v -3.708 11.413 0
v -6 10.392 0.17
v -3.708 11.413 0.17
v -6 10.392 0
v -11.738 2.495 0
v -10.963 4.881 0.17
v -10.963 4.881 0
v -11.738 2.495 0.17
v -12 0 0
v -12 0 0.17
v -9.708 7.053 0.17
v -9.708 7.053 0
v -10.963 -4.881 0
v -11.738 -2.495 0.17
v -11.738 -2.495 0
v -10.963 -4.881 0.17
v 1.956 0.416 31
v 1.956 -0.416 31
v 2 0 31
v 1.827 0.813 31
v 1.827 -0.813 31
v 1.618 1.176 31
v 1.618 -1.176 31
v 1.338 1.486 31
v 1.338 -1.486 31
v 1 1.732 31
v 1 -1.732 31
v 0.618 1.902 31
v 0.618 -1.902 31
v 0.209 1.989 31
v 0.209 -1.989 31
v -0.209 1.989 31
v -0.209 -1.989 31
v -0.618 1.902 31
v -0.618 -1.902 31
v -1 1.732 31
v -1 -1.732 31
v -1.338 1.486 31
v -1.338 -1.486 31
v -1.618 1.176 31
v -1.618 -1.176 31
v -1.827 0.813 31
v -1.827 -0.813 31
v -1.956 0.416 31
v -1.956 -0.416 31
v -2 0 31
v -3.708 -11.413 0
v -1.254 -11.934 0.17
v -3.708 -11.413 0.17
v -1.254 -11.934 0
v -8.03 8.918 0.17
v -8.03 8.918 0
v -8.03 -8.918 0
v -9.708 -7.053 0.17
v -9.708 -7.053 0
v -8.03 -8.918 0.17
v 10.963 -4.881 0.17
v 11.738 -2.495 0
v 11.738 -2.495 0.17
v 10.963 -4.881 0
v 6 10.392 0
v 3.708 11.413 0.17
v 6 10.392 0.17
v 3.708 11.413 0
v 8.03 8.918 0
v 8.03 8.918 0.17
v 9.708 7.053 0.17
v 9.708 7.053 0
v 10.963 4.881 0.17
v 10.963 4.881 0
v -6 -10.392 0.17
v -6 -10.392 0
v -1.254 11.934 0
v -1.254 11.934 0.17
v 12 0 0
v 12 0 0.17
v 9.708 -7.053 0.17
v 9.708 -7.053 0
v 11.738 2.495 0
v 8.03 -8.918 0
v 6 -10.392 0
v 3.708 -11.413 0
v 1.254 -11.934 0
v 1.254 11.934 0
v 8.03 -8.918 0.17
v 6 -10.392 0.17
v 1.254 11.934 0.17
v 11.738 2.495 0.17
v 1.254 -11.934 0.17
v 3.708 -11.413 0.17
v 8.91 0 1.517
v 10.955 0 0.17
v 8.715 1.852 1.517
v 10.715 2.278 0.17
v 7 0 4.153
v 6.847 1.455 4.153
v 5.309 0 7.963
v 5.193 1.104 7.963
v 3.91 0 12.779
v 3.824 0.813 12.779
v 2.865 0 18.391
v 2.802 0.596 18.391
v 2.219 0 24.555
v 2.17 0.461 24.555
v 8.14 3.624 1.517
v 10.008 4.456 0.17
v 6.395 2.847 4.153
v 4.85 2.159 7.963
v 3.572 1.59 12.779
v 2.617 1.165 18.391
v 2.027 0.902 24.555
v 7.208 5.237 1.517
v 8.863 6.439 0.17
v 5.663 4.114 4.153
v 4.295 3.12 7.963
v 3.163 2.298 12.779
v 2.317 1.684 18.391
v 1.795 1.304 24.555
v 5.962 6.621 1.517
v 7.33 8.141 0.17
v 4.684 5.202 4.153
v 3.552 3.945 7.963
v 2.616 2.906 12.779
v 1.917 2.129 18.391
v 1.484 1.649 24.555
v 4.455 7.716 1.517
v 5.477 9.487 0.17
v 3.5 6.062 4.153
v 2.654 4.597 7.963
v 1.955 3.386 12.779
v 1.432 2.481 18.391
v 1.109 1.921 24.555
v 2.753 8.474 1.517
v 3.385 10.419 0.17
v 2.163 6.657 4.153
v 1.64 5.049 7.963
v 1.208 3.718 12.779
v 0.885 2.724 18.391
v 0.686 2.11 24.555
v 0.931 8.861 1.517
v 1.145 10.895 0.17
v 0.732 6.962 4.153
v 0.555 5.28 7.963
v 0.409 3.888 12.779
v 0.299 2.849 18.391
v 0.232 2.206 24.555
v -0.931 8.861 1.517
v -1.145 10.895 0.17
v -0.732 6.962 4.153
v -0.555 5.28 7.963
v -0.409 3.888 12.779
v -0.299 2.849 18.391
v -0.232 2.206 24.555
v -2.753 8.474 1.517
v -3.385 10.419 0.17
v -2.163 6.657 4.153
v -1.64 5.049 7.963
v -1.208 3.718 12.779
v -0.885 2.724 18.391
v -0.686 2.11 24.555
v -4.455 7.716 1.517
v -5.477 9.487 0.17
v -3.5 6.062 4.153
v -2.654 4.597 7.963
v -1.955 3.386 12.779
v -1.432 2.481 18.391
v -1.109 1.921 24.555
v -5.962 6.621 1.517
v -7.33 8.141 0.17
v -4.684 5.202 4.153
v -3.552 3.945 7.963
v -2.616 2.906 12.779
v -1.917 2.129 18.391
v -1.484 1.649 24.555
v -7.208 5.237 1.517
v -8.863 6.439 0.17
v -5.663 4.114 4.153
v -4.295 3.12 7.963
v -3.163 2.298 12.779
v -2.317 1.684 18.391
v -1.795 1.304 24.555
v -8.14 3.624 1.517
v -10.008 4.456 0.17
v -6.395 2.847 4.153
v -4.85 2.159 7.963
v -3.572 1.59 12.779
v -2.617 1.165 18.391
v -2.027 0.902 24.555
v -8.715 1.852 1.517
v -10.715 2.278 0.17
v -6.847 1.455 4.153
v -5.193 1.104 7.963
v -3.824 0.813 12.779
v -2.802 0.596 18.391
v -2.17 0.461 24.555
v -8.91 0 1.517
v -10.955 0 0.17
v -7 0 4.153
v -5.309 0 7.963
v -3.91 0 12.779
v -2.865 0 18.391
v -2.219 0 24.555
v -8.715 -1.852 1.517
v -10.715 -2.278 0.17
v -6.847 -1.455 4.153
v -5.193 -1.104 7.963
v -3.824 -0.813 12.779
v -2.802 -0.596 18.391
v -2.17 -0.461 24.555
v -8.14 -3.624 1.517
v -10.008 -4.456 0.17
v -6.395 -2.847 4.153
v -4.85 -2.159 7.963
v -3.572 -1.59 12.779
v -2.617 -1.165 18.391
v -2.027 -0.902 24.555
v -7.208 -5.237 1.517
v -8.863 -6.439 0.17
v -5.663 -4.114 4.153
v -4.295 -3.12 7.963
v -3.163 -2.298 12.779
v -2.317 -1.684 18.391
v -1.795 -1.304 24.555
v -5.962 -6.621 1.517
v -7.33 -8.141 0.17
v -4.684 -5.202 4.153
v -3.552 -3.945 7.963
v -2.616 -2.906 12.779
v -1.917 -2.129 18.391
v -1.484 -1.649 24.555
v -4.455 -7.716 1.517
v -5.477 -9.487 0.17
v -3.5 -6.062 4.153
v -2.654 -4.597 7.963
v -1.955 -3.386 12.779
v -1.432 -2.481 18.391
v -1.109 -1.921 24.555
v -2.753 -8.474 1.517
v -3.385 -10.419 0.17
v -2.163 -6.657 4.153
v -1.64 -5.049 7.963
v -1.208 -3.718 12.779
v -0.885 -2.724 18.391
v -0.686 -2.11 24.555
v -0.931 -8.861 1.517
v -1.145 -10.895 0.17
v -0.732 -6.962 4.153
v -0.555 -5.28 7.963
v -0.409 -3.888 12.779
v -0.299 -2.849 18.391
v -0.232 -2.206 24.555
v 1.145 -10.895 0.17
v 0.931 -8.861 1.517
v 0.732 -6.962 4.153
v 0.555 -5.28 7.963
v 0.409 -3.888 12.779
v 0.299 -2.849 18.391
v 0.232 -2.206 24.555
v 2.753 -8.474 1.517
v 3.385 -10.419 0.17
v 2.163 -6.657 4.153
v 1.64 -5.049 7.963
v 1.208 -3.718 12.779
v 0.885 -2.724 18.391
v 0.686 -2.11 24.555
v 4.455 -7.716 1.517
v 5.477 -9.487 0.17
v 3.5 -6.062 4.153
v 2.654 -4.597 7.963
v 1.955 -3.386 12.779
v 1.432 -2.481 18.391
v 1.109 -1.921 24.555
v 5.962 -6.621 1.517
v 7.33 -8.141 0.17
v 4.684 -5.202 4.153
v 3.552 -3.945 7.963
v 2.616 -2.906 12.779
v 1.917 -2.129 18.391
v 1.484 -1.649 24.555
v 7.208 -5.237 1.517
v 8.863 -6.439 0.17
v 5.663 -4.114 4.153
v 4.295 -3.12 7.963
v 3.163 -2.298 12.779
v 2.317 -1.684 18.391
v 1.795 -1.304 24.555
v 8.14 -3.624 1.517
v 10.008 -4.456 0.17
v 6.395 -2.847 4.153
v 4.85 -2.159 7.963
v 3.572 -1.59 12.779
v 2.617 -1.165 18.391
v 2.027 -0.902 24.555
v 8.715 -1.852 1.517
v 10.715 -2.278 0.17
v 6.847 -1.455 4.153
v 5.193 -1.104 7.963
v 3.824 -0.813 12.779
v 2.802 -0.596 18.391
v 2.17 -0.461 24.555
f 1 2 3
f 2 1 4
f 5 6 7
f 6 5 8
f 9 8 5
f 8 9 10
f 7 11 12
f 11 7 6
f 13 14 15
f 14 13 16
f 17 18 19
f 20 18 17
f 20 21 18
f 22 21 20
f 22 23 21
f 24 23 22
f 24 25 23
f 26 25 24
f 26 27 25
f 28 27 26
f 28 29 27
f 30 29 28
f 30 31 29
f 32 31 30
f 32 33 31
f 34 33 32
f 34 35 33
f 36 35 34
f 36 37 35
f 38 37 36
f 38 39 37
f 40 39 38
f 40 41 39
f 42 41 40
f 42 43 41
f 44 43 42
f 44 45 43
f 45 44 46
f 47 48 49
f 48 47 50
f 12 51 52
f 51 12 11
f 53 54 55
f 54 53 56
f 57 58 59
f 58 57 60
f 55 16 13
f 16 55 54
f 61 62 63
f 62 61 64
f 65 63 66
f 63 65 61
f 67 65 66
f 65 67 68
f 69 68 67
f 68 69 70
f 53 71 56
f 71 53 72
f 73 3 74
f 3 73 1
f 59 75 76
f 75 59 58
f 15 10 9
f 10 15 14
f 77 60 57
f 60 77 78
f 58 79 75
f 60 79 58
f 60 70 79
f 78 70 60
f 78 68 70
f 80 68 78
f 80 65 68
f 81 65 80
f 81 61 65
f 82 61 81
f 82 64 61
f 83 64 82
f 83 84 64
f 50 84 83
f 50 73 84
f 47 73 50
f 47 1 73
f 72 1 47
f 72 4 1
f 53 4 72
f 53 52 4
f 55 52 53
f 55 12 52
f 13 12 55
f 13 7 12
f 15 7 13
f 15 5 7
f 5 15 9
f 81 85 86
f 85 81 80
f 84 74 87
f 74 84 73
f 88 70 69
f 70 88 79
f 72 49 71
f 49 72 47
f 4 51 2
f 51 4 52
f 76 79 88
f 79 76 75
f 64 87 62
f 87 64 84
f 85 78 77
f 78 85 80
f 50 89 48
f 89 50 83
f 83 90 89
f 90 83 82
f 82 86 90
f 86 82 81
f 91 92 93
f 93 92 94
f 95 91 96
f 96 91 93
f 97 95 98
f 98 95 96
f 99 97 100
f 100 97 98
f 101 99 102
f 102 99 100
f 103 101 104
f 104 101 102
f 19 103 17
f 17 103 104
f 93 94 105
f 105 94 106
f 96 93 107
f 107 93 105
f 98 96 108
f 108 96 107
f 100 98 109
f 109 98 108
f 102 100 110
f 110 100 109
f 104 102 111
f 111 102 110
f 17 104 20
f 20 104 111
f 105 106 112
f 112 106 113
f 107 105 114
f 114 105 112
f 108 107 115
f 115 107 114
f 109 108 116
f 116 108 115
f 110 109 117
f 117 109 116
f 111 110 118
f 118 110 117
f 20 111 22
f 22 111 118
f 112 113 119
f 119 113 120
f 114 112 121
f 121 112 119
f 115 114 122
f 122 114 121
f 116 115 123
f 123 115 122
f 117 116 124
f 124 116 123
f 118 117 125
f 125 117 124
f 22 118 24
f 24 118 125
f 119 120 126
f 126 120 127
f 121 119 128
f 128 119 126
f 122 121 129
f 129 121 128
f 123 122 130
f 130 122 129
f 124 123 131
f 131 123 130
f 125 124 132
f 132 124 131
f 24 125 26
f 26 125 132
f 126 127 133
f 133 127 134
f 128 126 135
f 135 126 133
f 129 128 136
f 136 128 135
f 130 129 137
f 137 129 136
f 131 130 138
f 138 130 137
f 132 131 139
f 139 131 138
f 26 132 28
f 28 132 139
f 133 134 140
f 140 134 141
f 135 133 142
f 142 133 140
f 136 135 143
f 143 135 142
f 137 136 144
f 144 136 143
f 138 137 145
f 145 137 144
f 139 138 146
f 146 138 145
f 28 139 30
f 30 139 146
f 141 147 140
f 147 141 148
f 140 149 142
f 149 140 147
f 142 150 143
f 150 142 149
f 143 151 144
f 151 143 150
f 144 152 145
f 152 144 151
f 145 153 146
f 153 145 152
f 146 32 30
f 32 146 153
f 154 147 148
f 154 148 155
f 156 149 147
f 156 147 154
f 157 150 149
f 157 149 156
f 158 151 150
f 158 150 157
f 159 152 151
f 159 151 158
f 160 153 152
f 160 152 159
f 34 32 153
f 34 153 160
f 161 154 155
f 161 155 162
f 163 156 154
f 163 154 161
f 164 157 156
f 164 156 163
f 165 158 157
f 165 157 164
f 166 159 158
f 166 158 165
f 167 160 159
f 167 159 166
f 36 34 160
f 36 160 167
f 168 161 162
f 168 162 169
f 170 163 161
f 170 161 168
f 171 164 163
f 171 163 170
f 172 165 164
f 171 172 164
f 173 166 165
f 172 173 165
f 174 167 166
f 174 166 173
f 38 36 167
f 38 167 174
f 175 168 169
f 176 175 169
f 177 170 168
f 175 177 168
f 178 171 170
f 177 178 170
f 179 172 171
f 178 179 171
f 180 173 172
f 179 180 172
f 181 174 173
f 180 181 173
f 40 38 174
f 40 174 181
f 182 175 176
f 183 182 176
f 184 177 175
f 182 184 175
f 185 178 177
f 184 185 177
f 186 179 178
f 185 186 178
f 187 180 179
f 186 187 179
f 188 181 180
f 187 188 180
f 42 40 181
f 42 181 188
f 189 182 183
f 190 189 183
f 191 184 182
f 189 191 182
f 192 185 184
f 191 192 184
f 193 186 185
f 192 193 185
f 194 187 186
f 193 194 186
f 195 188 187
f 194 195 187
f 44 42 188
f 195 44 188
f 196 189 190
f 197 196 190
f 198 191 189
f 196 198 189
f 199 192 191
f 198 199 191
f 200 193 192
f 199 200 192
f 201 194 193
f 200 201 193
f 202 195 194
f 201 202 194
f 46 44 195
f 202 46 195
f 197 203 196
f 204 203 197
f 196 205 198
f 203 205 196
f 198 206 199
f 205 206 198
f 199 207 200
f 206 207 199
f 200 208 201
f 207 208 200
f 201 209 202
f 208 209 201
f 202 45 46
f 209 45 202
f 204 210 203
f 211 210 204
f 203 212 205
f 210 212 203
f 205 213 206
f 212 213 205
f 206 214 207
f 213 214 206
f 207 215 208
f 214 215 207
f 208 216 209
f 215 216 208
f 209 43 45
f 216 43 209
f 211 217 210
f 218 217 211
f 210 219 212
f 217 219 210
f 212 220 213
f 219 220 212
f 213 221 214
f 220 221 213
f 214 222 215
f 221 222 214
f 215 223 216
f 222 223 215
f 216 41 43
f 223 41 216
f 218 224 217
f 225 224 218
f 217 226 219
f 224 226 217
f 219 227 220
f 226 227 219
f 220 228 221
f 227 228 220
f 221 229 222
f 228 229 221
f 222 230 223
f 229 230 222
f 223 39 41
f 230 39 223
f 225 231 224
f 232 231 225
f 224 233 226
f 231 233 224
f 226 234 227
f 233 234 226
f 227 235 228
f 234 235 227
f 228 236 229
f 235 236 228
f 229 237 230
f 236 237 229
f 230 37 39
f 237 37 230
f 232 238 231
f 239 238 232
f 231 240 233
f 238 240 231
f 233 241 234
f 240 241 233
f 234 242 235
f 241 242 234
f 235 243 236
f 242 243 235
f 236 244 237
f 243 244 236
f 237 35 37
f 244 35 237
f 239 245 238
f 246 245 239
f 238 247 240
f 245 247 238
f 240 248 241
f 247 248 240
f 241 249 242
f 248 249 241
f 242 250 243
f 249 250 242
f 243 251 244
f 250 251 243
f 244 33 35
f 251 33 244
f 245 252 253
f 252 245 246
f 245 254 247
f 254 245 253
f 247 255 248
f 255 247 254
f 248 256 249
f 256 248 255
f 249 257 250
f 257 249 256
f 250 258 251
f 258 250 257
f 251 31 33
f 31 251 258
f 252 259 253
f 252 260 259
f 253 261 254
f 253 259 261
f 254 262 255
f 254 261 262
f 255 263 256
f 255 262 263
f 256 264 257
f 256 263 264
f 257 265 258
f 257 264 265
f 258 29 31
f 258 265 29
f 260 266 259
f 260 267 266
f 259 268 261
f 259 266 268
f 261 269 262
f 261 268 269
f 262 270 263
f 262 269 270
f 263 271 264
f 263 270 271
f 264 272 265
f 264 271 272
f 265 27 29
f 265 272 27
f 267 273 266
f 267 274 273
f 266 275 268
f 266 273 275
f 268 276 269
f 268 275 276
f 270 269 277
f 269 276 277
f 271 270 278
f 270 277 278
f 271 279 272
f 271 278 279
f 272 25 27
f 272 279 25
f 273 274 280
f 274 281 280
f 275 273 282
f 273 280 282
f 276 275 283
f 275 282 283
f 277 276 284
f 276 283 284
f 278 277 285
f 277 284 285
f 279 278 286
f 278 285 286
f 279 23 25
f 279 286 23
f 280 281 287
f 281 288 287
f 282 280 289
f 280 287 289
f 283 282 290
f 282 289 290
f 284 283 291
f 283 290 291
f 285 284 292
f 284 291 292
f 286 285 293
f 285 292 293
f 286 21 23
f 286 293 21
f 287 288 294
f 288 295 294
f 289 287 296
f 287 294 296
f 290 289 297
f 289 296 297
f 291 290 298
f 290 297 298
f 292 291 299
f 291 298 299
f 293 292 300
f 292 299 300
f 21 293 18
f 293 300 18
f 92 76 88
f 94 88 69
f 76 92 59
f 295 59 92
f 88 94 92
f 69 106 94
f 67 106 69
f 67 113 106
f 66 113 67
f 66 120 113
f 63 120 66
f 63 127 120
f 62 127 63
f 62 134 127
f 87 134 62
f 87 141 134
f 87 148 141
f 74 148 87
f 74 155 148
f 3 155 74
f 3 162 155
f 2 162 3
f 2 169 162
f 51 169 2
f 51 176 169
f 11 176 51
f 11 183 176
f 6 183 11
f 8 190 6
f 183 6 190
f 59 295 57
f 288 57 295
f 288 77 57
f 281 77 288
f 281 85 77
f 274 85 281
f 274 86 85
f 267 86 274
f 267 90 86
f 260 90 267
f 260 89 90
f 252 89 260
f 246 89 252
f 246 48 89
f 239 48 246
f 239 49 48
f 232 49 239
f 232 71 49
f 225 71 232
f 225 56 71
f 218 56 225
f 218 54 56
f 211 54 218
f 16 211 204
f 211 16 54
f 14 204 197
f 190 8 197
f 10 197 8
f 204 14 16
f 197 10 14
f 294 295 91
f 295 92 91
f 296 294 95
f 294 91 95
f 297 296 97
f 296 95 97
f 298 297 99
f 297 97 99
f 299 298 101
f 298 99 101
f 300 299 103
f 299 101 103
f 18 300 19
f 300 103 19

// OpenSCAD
r1=2;
a_axis=10;
b_axis=31;

elliptical_cone(a_axis,b_axis, r1);


module elliptical_cone(a_axis, b_axis, r_cone_tip){
    // a_axis is the diameter f the cone base,
    // b_axis is the cone height
    // r_cone_tip is the radius tip (top) of the cone)
    //$fn=30;
    translate([0,0,b_axis])
        rotate (a = [0,180,0])
            difference() {
                cylinder(h=b_axis, r=a_axis+r_cone_tip);

                rotate_extrude(convexity = 10)
                    translate([a_axis+r_cone_tip,0,0])
                        ellipse(a_axis, b_axis);
            }
}


module ellipse(a_axis, b_axis) {
    scale([a_axis/a_axis,b_axis/a_axis])
        circle(r=a_axis);
}
